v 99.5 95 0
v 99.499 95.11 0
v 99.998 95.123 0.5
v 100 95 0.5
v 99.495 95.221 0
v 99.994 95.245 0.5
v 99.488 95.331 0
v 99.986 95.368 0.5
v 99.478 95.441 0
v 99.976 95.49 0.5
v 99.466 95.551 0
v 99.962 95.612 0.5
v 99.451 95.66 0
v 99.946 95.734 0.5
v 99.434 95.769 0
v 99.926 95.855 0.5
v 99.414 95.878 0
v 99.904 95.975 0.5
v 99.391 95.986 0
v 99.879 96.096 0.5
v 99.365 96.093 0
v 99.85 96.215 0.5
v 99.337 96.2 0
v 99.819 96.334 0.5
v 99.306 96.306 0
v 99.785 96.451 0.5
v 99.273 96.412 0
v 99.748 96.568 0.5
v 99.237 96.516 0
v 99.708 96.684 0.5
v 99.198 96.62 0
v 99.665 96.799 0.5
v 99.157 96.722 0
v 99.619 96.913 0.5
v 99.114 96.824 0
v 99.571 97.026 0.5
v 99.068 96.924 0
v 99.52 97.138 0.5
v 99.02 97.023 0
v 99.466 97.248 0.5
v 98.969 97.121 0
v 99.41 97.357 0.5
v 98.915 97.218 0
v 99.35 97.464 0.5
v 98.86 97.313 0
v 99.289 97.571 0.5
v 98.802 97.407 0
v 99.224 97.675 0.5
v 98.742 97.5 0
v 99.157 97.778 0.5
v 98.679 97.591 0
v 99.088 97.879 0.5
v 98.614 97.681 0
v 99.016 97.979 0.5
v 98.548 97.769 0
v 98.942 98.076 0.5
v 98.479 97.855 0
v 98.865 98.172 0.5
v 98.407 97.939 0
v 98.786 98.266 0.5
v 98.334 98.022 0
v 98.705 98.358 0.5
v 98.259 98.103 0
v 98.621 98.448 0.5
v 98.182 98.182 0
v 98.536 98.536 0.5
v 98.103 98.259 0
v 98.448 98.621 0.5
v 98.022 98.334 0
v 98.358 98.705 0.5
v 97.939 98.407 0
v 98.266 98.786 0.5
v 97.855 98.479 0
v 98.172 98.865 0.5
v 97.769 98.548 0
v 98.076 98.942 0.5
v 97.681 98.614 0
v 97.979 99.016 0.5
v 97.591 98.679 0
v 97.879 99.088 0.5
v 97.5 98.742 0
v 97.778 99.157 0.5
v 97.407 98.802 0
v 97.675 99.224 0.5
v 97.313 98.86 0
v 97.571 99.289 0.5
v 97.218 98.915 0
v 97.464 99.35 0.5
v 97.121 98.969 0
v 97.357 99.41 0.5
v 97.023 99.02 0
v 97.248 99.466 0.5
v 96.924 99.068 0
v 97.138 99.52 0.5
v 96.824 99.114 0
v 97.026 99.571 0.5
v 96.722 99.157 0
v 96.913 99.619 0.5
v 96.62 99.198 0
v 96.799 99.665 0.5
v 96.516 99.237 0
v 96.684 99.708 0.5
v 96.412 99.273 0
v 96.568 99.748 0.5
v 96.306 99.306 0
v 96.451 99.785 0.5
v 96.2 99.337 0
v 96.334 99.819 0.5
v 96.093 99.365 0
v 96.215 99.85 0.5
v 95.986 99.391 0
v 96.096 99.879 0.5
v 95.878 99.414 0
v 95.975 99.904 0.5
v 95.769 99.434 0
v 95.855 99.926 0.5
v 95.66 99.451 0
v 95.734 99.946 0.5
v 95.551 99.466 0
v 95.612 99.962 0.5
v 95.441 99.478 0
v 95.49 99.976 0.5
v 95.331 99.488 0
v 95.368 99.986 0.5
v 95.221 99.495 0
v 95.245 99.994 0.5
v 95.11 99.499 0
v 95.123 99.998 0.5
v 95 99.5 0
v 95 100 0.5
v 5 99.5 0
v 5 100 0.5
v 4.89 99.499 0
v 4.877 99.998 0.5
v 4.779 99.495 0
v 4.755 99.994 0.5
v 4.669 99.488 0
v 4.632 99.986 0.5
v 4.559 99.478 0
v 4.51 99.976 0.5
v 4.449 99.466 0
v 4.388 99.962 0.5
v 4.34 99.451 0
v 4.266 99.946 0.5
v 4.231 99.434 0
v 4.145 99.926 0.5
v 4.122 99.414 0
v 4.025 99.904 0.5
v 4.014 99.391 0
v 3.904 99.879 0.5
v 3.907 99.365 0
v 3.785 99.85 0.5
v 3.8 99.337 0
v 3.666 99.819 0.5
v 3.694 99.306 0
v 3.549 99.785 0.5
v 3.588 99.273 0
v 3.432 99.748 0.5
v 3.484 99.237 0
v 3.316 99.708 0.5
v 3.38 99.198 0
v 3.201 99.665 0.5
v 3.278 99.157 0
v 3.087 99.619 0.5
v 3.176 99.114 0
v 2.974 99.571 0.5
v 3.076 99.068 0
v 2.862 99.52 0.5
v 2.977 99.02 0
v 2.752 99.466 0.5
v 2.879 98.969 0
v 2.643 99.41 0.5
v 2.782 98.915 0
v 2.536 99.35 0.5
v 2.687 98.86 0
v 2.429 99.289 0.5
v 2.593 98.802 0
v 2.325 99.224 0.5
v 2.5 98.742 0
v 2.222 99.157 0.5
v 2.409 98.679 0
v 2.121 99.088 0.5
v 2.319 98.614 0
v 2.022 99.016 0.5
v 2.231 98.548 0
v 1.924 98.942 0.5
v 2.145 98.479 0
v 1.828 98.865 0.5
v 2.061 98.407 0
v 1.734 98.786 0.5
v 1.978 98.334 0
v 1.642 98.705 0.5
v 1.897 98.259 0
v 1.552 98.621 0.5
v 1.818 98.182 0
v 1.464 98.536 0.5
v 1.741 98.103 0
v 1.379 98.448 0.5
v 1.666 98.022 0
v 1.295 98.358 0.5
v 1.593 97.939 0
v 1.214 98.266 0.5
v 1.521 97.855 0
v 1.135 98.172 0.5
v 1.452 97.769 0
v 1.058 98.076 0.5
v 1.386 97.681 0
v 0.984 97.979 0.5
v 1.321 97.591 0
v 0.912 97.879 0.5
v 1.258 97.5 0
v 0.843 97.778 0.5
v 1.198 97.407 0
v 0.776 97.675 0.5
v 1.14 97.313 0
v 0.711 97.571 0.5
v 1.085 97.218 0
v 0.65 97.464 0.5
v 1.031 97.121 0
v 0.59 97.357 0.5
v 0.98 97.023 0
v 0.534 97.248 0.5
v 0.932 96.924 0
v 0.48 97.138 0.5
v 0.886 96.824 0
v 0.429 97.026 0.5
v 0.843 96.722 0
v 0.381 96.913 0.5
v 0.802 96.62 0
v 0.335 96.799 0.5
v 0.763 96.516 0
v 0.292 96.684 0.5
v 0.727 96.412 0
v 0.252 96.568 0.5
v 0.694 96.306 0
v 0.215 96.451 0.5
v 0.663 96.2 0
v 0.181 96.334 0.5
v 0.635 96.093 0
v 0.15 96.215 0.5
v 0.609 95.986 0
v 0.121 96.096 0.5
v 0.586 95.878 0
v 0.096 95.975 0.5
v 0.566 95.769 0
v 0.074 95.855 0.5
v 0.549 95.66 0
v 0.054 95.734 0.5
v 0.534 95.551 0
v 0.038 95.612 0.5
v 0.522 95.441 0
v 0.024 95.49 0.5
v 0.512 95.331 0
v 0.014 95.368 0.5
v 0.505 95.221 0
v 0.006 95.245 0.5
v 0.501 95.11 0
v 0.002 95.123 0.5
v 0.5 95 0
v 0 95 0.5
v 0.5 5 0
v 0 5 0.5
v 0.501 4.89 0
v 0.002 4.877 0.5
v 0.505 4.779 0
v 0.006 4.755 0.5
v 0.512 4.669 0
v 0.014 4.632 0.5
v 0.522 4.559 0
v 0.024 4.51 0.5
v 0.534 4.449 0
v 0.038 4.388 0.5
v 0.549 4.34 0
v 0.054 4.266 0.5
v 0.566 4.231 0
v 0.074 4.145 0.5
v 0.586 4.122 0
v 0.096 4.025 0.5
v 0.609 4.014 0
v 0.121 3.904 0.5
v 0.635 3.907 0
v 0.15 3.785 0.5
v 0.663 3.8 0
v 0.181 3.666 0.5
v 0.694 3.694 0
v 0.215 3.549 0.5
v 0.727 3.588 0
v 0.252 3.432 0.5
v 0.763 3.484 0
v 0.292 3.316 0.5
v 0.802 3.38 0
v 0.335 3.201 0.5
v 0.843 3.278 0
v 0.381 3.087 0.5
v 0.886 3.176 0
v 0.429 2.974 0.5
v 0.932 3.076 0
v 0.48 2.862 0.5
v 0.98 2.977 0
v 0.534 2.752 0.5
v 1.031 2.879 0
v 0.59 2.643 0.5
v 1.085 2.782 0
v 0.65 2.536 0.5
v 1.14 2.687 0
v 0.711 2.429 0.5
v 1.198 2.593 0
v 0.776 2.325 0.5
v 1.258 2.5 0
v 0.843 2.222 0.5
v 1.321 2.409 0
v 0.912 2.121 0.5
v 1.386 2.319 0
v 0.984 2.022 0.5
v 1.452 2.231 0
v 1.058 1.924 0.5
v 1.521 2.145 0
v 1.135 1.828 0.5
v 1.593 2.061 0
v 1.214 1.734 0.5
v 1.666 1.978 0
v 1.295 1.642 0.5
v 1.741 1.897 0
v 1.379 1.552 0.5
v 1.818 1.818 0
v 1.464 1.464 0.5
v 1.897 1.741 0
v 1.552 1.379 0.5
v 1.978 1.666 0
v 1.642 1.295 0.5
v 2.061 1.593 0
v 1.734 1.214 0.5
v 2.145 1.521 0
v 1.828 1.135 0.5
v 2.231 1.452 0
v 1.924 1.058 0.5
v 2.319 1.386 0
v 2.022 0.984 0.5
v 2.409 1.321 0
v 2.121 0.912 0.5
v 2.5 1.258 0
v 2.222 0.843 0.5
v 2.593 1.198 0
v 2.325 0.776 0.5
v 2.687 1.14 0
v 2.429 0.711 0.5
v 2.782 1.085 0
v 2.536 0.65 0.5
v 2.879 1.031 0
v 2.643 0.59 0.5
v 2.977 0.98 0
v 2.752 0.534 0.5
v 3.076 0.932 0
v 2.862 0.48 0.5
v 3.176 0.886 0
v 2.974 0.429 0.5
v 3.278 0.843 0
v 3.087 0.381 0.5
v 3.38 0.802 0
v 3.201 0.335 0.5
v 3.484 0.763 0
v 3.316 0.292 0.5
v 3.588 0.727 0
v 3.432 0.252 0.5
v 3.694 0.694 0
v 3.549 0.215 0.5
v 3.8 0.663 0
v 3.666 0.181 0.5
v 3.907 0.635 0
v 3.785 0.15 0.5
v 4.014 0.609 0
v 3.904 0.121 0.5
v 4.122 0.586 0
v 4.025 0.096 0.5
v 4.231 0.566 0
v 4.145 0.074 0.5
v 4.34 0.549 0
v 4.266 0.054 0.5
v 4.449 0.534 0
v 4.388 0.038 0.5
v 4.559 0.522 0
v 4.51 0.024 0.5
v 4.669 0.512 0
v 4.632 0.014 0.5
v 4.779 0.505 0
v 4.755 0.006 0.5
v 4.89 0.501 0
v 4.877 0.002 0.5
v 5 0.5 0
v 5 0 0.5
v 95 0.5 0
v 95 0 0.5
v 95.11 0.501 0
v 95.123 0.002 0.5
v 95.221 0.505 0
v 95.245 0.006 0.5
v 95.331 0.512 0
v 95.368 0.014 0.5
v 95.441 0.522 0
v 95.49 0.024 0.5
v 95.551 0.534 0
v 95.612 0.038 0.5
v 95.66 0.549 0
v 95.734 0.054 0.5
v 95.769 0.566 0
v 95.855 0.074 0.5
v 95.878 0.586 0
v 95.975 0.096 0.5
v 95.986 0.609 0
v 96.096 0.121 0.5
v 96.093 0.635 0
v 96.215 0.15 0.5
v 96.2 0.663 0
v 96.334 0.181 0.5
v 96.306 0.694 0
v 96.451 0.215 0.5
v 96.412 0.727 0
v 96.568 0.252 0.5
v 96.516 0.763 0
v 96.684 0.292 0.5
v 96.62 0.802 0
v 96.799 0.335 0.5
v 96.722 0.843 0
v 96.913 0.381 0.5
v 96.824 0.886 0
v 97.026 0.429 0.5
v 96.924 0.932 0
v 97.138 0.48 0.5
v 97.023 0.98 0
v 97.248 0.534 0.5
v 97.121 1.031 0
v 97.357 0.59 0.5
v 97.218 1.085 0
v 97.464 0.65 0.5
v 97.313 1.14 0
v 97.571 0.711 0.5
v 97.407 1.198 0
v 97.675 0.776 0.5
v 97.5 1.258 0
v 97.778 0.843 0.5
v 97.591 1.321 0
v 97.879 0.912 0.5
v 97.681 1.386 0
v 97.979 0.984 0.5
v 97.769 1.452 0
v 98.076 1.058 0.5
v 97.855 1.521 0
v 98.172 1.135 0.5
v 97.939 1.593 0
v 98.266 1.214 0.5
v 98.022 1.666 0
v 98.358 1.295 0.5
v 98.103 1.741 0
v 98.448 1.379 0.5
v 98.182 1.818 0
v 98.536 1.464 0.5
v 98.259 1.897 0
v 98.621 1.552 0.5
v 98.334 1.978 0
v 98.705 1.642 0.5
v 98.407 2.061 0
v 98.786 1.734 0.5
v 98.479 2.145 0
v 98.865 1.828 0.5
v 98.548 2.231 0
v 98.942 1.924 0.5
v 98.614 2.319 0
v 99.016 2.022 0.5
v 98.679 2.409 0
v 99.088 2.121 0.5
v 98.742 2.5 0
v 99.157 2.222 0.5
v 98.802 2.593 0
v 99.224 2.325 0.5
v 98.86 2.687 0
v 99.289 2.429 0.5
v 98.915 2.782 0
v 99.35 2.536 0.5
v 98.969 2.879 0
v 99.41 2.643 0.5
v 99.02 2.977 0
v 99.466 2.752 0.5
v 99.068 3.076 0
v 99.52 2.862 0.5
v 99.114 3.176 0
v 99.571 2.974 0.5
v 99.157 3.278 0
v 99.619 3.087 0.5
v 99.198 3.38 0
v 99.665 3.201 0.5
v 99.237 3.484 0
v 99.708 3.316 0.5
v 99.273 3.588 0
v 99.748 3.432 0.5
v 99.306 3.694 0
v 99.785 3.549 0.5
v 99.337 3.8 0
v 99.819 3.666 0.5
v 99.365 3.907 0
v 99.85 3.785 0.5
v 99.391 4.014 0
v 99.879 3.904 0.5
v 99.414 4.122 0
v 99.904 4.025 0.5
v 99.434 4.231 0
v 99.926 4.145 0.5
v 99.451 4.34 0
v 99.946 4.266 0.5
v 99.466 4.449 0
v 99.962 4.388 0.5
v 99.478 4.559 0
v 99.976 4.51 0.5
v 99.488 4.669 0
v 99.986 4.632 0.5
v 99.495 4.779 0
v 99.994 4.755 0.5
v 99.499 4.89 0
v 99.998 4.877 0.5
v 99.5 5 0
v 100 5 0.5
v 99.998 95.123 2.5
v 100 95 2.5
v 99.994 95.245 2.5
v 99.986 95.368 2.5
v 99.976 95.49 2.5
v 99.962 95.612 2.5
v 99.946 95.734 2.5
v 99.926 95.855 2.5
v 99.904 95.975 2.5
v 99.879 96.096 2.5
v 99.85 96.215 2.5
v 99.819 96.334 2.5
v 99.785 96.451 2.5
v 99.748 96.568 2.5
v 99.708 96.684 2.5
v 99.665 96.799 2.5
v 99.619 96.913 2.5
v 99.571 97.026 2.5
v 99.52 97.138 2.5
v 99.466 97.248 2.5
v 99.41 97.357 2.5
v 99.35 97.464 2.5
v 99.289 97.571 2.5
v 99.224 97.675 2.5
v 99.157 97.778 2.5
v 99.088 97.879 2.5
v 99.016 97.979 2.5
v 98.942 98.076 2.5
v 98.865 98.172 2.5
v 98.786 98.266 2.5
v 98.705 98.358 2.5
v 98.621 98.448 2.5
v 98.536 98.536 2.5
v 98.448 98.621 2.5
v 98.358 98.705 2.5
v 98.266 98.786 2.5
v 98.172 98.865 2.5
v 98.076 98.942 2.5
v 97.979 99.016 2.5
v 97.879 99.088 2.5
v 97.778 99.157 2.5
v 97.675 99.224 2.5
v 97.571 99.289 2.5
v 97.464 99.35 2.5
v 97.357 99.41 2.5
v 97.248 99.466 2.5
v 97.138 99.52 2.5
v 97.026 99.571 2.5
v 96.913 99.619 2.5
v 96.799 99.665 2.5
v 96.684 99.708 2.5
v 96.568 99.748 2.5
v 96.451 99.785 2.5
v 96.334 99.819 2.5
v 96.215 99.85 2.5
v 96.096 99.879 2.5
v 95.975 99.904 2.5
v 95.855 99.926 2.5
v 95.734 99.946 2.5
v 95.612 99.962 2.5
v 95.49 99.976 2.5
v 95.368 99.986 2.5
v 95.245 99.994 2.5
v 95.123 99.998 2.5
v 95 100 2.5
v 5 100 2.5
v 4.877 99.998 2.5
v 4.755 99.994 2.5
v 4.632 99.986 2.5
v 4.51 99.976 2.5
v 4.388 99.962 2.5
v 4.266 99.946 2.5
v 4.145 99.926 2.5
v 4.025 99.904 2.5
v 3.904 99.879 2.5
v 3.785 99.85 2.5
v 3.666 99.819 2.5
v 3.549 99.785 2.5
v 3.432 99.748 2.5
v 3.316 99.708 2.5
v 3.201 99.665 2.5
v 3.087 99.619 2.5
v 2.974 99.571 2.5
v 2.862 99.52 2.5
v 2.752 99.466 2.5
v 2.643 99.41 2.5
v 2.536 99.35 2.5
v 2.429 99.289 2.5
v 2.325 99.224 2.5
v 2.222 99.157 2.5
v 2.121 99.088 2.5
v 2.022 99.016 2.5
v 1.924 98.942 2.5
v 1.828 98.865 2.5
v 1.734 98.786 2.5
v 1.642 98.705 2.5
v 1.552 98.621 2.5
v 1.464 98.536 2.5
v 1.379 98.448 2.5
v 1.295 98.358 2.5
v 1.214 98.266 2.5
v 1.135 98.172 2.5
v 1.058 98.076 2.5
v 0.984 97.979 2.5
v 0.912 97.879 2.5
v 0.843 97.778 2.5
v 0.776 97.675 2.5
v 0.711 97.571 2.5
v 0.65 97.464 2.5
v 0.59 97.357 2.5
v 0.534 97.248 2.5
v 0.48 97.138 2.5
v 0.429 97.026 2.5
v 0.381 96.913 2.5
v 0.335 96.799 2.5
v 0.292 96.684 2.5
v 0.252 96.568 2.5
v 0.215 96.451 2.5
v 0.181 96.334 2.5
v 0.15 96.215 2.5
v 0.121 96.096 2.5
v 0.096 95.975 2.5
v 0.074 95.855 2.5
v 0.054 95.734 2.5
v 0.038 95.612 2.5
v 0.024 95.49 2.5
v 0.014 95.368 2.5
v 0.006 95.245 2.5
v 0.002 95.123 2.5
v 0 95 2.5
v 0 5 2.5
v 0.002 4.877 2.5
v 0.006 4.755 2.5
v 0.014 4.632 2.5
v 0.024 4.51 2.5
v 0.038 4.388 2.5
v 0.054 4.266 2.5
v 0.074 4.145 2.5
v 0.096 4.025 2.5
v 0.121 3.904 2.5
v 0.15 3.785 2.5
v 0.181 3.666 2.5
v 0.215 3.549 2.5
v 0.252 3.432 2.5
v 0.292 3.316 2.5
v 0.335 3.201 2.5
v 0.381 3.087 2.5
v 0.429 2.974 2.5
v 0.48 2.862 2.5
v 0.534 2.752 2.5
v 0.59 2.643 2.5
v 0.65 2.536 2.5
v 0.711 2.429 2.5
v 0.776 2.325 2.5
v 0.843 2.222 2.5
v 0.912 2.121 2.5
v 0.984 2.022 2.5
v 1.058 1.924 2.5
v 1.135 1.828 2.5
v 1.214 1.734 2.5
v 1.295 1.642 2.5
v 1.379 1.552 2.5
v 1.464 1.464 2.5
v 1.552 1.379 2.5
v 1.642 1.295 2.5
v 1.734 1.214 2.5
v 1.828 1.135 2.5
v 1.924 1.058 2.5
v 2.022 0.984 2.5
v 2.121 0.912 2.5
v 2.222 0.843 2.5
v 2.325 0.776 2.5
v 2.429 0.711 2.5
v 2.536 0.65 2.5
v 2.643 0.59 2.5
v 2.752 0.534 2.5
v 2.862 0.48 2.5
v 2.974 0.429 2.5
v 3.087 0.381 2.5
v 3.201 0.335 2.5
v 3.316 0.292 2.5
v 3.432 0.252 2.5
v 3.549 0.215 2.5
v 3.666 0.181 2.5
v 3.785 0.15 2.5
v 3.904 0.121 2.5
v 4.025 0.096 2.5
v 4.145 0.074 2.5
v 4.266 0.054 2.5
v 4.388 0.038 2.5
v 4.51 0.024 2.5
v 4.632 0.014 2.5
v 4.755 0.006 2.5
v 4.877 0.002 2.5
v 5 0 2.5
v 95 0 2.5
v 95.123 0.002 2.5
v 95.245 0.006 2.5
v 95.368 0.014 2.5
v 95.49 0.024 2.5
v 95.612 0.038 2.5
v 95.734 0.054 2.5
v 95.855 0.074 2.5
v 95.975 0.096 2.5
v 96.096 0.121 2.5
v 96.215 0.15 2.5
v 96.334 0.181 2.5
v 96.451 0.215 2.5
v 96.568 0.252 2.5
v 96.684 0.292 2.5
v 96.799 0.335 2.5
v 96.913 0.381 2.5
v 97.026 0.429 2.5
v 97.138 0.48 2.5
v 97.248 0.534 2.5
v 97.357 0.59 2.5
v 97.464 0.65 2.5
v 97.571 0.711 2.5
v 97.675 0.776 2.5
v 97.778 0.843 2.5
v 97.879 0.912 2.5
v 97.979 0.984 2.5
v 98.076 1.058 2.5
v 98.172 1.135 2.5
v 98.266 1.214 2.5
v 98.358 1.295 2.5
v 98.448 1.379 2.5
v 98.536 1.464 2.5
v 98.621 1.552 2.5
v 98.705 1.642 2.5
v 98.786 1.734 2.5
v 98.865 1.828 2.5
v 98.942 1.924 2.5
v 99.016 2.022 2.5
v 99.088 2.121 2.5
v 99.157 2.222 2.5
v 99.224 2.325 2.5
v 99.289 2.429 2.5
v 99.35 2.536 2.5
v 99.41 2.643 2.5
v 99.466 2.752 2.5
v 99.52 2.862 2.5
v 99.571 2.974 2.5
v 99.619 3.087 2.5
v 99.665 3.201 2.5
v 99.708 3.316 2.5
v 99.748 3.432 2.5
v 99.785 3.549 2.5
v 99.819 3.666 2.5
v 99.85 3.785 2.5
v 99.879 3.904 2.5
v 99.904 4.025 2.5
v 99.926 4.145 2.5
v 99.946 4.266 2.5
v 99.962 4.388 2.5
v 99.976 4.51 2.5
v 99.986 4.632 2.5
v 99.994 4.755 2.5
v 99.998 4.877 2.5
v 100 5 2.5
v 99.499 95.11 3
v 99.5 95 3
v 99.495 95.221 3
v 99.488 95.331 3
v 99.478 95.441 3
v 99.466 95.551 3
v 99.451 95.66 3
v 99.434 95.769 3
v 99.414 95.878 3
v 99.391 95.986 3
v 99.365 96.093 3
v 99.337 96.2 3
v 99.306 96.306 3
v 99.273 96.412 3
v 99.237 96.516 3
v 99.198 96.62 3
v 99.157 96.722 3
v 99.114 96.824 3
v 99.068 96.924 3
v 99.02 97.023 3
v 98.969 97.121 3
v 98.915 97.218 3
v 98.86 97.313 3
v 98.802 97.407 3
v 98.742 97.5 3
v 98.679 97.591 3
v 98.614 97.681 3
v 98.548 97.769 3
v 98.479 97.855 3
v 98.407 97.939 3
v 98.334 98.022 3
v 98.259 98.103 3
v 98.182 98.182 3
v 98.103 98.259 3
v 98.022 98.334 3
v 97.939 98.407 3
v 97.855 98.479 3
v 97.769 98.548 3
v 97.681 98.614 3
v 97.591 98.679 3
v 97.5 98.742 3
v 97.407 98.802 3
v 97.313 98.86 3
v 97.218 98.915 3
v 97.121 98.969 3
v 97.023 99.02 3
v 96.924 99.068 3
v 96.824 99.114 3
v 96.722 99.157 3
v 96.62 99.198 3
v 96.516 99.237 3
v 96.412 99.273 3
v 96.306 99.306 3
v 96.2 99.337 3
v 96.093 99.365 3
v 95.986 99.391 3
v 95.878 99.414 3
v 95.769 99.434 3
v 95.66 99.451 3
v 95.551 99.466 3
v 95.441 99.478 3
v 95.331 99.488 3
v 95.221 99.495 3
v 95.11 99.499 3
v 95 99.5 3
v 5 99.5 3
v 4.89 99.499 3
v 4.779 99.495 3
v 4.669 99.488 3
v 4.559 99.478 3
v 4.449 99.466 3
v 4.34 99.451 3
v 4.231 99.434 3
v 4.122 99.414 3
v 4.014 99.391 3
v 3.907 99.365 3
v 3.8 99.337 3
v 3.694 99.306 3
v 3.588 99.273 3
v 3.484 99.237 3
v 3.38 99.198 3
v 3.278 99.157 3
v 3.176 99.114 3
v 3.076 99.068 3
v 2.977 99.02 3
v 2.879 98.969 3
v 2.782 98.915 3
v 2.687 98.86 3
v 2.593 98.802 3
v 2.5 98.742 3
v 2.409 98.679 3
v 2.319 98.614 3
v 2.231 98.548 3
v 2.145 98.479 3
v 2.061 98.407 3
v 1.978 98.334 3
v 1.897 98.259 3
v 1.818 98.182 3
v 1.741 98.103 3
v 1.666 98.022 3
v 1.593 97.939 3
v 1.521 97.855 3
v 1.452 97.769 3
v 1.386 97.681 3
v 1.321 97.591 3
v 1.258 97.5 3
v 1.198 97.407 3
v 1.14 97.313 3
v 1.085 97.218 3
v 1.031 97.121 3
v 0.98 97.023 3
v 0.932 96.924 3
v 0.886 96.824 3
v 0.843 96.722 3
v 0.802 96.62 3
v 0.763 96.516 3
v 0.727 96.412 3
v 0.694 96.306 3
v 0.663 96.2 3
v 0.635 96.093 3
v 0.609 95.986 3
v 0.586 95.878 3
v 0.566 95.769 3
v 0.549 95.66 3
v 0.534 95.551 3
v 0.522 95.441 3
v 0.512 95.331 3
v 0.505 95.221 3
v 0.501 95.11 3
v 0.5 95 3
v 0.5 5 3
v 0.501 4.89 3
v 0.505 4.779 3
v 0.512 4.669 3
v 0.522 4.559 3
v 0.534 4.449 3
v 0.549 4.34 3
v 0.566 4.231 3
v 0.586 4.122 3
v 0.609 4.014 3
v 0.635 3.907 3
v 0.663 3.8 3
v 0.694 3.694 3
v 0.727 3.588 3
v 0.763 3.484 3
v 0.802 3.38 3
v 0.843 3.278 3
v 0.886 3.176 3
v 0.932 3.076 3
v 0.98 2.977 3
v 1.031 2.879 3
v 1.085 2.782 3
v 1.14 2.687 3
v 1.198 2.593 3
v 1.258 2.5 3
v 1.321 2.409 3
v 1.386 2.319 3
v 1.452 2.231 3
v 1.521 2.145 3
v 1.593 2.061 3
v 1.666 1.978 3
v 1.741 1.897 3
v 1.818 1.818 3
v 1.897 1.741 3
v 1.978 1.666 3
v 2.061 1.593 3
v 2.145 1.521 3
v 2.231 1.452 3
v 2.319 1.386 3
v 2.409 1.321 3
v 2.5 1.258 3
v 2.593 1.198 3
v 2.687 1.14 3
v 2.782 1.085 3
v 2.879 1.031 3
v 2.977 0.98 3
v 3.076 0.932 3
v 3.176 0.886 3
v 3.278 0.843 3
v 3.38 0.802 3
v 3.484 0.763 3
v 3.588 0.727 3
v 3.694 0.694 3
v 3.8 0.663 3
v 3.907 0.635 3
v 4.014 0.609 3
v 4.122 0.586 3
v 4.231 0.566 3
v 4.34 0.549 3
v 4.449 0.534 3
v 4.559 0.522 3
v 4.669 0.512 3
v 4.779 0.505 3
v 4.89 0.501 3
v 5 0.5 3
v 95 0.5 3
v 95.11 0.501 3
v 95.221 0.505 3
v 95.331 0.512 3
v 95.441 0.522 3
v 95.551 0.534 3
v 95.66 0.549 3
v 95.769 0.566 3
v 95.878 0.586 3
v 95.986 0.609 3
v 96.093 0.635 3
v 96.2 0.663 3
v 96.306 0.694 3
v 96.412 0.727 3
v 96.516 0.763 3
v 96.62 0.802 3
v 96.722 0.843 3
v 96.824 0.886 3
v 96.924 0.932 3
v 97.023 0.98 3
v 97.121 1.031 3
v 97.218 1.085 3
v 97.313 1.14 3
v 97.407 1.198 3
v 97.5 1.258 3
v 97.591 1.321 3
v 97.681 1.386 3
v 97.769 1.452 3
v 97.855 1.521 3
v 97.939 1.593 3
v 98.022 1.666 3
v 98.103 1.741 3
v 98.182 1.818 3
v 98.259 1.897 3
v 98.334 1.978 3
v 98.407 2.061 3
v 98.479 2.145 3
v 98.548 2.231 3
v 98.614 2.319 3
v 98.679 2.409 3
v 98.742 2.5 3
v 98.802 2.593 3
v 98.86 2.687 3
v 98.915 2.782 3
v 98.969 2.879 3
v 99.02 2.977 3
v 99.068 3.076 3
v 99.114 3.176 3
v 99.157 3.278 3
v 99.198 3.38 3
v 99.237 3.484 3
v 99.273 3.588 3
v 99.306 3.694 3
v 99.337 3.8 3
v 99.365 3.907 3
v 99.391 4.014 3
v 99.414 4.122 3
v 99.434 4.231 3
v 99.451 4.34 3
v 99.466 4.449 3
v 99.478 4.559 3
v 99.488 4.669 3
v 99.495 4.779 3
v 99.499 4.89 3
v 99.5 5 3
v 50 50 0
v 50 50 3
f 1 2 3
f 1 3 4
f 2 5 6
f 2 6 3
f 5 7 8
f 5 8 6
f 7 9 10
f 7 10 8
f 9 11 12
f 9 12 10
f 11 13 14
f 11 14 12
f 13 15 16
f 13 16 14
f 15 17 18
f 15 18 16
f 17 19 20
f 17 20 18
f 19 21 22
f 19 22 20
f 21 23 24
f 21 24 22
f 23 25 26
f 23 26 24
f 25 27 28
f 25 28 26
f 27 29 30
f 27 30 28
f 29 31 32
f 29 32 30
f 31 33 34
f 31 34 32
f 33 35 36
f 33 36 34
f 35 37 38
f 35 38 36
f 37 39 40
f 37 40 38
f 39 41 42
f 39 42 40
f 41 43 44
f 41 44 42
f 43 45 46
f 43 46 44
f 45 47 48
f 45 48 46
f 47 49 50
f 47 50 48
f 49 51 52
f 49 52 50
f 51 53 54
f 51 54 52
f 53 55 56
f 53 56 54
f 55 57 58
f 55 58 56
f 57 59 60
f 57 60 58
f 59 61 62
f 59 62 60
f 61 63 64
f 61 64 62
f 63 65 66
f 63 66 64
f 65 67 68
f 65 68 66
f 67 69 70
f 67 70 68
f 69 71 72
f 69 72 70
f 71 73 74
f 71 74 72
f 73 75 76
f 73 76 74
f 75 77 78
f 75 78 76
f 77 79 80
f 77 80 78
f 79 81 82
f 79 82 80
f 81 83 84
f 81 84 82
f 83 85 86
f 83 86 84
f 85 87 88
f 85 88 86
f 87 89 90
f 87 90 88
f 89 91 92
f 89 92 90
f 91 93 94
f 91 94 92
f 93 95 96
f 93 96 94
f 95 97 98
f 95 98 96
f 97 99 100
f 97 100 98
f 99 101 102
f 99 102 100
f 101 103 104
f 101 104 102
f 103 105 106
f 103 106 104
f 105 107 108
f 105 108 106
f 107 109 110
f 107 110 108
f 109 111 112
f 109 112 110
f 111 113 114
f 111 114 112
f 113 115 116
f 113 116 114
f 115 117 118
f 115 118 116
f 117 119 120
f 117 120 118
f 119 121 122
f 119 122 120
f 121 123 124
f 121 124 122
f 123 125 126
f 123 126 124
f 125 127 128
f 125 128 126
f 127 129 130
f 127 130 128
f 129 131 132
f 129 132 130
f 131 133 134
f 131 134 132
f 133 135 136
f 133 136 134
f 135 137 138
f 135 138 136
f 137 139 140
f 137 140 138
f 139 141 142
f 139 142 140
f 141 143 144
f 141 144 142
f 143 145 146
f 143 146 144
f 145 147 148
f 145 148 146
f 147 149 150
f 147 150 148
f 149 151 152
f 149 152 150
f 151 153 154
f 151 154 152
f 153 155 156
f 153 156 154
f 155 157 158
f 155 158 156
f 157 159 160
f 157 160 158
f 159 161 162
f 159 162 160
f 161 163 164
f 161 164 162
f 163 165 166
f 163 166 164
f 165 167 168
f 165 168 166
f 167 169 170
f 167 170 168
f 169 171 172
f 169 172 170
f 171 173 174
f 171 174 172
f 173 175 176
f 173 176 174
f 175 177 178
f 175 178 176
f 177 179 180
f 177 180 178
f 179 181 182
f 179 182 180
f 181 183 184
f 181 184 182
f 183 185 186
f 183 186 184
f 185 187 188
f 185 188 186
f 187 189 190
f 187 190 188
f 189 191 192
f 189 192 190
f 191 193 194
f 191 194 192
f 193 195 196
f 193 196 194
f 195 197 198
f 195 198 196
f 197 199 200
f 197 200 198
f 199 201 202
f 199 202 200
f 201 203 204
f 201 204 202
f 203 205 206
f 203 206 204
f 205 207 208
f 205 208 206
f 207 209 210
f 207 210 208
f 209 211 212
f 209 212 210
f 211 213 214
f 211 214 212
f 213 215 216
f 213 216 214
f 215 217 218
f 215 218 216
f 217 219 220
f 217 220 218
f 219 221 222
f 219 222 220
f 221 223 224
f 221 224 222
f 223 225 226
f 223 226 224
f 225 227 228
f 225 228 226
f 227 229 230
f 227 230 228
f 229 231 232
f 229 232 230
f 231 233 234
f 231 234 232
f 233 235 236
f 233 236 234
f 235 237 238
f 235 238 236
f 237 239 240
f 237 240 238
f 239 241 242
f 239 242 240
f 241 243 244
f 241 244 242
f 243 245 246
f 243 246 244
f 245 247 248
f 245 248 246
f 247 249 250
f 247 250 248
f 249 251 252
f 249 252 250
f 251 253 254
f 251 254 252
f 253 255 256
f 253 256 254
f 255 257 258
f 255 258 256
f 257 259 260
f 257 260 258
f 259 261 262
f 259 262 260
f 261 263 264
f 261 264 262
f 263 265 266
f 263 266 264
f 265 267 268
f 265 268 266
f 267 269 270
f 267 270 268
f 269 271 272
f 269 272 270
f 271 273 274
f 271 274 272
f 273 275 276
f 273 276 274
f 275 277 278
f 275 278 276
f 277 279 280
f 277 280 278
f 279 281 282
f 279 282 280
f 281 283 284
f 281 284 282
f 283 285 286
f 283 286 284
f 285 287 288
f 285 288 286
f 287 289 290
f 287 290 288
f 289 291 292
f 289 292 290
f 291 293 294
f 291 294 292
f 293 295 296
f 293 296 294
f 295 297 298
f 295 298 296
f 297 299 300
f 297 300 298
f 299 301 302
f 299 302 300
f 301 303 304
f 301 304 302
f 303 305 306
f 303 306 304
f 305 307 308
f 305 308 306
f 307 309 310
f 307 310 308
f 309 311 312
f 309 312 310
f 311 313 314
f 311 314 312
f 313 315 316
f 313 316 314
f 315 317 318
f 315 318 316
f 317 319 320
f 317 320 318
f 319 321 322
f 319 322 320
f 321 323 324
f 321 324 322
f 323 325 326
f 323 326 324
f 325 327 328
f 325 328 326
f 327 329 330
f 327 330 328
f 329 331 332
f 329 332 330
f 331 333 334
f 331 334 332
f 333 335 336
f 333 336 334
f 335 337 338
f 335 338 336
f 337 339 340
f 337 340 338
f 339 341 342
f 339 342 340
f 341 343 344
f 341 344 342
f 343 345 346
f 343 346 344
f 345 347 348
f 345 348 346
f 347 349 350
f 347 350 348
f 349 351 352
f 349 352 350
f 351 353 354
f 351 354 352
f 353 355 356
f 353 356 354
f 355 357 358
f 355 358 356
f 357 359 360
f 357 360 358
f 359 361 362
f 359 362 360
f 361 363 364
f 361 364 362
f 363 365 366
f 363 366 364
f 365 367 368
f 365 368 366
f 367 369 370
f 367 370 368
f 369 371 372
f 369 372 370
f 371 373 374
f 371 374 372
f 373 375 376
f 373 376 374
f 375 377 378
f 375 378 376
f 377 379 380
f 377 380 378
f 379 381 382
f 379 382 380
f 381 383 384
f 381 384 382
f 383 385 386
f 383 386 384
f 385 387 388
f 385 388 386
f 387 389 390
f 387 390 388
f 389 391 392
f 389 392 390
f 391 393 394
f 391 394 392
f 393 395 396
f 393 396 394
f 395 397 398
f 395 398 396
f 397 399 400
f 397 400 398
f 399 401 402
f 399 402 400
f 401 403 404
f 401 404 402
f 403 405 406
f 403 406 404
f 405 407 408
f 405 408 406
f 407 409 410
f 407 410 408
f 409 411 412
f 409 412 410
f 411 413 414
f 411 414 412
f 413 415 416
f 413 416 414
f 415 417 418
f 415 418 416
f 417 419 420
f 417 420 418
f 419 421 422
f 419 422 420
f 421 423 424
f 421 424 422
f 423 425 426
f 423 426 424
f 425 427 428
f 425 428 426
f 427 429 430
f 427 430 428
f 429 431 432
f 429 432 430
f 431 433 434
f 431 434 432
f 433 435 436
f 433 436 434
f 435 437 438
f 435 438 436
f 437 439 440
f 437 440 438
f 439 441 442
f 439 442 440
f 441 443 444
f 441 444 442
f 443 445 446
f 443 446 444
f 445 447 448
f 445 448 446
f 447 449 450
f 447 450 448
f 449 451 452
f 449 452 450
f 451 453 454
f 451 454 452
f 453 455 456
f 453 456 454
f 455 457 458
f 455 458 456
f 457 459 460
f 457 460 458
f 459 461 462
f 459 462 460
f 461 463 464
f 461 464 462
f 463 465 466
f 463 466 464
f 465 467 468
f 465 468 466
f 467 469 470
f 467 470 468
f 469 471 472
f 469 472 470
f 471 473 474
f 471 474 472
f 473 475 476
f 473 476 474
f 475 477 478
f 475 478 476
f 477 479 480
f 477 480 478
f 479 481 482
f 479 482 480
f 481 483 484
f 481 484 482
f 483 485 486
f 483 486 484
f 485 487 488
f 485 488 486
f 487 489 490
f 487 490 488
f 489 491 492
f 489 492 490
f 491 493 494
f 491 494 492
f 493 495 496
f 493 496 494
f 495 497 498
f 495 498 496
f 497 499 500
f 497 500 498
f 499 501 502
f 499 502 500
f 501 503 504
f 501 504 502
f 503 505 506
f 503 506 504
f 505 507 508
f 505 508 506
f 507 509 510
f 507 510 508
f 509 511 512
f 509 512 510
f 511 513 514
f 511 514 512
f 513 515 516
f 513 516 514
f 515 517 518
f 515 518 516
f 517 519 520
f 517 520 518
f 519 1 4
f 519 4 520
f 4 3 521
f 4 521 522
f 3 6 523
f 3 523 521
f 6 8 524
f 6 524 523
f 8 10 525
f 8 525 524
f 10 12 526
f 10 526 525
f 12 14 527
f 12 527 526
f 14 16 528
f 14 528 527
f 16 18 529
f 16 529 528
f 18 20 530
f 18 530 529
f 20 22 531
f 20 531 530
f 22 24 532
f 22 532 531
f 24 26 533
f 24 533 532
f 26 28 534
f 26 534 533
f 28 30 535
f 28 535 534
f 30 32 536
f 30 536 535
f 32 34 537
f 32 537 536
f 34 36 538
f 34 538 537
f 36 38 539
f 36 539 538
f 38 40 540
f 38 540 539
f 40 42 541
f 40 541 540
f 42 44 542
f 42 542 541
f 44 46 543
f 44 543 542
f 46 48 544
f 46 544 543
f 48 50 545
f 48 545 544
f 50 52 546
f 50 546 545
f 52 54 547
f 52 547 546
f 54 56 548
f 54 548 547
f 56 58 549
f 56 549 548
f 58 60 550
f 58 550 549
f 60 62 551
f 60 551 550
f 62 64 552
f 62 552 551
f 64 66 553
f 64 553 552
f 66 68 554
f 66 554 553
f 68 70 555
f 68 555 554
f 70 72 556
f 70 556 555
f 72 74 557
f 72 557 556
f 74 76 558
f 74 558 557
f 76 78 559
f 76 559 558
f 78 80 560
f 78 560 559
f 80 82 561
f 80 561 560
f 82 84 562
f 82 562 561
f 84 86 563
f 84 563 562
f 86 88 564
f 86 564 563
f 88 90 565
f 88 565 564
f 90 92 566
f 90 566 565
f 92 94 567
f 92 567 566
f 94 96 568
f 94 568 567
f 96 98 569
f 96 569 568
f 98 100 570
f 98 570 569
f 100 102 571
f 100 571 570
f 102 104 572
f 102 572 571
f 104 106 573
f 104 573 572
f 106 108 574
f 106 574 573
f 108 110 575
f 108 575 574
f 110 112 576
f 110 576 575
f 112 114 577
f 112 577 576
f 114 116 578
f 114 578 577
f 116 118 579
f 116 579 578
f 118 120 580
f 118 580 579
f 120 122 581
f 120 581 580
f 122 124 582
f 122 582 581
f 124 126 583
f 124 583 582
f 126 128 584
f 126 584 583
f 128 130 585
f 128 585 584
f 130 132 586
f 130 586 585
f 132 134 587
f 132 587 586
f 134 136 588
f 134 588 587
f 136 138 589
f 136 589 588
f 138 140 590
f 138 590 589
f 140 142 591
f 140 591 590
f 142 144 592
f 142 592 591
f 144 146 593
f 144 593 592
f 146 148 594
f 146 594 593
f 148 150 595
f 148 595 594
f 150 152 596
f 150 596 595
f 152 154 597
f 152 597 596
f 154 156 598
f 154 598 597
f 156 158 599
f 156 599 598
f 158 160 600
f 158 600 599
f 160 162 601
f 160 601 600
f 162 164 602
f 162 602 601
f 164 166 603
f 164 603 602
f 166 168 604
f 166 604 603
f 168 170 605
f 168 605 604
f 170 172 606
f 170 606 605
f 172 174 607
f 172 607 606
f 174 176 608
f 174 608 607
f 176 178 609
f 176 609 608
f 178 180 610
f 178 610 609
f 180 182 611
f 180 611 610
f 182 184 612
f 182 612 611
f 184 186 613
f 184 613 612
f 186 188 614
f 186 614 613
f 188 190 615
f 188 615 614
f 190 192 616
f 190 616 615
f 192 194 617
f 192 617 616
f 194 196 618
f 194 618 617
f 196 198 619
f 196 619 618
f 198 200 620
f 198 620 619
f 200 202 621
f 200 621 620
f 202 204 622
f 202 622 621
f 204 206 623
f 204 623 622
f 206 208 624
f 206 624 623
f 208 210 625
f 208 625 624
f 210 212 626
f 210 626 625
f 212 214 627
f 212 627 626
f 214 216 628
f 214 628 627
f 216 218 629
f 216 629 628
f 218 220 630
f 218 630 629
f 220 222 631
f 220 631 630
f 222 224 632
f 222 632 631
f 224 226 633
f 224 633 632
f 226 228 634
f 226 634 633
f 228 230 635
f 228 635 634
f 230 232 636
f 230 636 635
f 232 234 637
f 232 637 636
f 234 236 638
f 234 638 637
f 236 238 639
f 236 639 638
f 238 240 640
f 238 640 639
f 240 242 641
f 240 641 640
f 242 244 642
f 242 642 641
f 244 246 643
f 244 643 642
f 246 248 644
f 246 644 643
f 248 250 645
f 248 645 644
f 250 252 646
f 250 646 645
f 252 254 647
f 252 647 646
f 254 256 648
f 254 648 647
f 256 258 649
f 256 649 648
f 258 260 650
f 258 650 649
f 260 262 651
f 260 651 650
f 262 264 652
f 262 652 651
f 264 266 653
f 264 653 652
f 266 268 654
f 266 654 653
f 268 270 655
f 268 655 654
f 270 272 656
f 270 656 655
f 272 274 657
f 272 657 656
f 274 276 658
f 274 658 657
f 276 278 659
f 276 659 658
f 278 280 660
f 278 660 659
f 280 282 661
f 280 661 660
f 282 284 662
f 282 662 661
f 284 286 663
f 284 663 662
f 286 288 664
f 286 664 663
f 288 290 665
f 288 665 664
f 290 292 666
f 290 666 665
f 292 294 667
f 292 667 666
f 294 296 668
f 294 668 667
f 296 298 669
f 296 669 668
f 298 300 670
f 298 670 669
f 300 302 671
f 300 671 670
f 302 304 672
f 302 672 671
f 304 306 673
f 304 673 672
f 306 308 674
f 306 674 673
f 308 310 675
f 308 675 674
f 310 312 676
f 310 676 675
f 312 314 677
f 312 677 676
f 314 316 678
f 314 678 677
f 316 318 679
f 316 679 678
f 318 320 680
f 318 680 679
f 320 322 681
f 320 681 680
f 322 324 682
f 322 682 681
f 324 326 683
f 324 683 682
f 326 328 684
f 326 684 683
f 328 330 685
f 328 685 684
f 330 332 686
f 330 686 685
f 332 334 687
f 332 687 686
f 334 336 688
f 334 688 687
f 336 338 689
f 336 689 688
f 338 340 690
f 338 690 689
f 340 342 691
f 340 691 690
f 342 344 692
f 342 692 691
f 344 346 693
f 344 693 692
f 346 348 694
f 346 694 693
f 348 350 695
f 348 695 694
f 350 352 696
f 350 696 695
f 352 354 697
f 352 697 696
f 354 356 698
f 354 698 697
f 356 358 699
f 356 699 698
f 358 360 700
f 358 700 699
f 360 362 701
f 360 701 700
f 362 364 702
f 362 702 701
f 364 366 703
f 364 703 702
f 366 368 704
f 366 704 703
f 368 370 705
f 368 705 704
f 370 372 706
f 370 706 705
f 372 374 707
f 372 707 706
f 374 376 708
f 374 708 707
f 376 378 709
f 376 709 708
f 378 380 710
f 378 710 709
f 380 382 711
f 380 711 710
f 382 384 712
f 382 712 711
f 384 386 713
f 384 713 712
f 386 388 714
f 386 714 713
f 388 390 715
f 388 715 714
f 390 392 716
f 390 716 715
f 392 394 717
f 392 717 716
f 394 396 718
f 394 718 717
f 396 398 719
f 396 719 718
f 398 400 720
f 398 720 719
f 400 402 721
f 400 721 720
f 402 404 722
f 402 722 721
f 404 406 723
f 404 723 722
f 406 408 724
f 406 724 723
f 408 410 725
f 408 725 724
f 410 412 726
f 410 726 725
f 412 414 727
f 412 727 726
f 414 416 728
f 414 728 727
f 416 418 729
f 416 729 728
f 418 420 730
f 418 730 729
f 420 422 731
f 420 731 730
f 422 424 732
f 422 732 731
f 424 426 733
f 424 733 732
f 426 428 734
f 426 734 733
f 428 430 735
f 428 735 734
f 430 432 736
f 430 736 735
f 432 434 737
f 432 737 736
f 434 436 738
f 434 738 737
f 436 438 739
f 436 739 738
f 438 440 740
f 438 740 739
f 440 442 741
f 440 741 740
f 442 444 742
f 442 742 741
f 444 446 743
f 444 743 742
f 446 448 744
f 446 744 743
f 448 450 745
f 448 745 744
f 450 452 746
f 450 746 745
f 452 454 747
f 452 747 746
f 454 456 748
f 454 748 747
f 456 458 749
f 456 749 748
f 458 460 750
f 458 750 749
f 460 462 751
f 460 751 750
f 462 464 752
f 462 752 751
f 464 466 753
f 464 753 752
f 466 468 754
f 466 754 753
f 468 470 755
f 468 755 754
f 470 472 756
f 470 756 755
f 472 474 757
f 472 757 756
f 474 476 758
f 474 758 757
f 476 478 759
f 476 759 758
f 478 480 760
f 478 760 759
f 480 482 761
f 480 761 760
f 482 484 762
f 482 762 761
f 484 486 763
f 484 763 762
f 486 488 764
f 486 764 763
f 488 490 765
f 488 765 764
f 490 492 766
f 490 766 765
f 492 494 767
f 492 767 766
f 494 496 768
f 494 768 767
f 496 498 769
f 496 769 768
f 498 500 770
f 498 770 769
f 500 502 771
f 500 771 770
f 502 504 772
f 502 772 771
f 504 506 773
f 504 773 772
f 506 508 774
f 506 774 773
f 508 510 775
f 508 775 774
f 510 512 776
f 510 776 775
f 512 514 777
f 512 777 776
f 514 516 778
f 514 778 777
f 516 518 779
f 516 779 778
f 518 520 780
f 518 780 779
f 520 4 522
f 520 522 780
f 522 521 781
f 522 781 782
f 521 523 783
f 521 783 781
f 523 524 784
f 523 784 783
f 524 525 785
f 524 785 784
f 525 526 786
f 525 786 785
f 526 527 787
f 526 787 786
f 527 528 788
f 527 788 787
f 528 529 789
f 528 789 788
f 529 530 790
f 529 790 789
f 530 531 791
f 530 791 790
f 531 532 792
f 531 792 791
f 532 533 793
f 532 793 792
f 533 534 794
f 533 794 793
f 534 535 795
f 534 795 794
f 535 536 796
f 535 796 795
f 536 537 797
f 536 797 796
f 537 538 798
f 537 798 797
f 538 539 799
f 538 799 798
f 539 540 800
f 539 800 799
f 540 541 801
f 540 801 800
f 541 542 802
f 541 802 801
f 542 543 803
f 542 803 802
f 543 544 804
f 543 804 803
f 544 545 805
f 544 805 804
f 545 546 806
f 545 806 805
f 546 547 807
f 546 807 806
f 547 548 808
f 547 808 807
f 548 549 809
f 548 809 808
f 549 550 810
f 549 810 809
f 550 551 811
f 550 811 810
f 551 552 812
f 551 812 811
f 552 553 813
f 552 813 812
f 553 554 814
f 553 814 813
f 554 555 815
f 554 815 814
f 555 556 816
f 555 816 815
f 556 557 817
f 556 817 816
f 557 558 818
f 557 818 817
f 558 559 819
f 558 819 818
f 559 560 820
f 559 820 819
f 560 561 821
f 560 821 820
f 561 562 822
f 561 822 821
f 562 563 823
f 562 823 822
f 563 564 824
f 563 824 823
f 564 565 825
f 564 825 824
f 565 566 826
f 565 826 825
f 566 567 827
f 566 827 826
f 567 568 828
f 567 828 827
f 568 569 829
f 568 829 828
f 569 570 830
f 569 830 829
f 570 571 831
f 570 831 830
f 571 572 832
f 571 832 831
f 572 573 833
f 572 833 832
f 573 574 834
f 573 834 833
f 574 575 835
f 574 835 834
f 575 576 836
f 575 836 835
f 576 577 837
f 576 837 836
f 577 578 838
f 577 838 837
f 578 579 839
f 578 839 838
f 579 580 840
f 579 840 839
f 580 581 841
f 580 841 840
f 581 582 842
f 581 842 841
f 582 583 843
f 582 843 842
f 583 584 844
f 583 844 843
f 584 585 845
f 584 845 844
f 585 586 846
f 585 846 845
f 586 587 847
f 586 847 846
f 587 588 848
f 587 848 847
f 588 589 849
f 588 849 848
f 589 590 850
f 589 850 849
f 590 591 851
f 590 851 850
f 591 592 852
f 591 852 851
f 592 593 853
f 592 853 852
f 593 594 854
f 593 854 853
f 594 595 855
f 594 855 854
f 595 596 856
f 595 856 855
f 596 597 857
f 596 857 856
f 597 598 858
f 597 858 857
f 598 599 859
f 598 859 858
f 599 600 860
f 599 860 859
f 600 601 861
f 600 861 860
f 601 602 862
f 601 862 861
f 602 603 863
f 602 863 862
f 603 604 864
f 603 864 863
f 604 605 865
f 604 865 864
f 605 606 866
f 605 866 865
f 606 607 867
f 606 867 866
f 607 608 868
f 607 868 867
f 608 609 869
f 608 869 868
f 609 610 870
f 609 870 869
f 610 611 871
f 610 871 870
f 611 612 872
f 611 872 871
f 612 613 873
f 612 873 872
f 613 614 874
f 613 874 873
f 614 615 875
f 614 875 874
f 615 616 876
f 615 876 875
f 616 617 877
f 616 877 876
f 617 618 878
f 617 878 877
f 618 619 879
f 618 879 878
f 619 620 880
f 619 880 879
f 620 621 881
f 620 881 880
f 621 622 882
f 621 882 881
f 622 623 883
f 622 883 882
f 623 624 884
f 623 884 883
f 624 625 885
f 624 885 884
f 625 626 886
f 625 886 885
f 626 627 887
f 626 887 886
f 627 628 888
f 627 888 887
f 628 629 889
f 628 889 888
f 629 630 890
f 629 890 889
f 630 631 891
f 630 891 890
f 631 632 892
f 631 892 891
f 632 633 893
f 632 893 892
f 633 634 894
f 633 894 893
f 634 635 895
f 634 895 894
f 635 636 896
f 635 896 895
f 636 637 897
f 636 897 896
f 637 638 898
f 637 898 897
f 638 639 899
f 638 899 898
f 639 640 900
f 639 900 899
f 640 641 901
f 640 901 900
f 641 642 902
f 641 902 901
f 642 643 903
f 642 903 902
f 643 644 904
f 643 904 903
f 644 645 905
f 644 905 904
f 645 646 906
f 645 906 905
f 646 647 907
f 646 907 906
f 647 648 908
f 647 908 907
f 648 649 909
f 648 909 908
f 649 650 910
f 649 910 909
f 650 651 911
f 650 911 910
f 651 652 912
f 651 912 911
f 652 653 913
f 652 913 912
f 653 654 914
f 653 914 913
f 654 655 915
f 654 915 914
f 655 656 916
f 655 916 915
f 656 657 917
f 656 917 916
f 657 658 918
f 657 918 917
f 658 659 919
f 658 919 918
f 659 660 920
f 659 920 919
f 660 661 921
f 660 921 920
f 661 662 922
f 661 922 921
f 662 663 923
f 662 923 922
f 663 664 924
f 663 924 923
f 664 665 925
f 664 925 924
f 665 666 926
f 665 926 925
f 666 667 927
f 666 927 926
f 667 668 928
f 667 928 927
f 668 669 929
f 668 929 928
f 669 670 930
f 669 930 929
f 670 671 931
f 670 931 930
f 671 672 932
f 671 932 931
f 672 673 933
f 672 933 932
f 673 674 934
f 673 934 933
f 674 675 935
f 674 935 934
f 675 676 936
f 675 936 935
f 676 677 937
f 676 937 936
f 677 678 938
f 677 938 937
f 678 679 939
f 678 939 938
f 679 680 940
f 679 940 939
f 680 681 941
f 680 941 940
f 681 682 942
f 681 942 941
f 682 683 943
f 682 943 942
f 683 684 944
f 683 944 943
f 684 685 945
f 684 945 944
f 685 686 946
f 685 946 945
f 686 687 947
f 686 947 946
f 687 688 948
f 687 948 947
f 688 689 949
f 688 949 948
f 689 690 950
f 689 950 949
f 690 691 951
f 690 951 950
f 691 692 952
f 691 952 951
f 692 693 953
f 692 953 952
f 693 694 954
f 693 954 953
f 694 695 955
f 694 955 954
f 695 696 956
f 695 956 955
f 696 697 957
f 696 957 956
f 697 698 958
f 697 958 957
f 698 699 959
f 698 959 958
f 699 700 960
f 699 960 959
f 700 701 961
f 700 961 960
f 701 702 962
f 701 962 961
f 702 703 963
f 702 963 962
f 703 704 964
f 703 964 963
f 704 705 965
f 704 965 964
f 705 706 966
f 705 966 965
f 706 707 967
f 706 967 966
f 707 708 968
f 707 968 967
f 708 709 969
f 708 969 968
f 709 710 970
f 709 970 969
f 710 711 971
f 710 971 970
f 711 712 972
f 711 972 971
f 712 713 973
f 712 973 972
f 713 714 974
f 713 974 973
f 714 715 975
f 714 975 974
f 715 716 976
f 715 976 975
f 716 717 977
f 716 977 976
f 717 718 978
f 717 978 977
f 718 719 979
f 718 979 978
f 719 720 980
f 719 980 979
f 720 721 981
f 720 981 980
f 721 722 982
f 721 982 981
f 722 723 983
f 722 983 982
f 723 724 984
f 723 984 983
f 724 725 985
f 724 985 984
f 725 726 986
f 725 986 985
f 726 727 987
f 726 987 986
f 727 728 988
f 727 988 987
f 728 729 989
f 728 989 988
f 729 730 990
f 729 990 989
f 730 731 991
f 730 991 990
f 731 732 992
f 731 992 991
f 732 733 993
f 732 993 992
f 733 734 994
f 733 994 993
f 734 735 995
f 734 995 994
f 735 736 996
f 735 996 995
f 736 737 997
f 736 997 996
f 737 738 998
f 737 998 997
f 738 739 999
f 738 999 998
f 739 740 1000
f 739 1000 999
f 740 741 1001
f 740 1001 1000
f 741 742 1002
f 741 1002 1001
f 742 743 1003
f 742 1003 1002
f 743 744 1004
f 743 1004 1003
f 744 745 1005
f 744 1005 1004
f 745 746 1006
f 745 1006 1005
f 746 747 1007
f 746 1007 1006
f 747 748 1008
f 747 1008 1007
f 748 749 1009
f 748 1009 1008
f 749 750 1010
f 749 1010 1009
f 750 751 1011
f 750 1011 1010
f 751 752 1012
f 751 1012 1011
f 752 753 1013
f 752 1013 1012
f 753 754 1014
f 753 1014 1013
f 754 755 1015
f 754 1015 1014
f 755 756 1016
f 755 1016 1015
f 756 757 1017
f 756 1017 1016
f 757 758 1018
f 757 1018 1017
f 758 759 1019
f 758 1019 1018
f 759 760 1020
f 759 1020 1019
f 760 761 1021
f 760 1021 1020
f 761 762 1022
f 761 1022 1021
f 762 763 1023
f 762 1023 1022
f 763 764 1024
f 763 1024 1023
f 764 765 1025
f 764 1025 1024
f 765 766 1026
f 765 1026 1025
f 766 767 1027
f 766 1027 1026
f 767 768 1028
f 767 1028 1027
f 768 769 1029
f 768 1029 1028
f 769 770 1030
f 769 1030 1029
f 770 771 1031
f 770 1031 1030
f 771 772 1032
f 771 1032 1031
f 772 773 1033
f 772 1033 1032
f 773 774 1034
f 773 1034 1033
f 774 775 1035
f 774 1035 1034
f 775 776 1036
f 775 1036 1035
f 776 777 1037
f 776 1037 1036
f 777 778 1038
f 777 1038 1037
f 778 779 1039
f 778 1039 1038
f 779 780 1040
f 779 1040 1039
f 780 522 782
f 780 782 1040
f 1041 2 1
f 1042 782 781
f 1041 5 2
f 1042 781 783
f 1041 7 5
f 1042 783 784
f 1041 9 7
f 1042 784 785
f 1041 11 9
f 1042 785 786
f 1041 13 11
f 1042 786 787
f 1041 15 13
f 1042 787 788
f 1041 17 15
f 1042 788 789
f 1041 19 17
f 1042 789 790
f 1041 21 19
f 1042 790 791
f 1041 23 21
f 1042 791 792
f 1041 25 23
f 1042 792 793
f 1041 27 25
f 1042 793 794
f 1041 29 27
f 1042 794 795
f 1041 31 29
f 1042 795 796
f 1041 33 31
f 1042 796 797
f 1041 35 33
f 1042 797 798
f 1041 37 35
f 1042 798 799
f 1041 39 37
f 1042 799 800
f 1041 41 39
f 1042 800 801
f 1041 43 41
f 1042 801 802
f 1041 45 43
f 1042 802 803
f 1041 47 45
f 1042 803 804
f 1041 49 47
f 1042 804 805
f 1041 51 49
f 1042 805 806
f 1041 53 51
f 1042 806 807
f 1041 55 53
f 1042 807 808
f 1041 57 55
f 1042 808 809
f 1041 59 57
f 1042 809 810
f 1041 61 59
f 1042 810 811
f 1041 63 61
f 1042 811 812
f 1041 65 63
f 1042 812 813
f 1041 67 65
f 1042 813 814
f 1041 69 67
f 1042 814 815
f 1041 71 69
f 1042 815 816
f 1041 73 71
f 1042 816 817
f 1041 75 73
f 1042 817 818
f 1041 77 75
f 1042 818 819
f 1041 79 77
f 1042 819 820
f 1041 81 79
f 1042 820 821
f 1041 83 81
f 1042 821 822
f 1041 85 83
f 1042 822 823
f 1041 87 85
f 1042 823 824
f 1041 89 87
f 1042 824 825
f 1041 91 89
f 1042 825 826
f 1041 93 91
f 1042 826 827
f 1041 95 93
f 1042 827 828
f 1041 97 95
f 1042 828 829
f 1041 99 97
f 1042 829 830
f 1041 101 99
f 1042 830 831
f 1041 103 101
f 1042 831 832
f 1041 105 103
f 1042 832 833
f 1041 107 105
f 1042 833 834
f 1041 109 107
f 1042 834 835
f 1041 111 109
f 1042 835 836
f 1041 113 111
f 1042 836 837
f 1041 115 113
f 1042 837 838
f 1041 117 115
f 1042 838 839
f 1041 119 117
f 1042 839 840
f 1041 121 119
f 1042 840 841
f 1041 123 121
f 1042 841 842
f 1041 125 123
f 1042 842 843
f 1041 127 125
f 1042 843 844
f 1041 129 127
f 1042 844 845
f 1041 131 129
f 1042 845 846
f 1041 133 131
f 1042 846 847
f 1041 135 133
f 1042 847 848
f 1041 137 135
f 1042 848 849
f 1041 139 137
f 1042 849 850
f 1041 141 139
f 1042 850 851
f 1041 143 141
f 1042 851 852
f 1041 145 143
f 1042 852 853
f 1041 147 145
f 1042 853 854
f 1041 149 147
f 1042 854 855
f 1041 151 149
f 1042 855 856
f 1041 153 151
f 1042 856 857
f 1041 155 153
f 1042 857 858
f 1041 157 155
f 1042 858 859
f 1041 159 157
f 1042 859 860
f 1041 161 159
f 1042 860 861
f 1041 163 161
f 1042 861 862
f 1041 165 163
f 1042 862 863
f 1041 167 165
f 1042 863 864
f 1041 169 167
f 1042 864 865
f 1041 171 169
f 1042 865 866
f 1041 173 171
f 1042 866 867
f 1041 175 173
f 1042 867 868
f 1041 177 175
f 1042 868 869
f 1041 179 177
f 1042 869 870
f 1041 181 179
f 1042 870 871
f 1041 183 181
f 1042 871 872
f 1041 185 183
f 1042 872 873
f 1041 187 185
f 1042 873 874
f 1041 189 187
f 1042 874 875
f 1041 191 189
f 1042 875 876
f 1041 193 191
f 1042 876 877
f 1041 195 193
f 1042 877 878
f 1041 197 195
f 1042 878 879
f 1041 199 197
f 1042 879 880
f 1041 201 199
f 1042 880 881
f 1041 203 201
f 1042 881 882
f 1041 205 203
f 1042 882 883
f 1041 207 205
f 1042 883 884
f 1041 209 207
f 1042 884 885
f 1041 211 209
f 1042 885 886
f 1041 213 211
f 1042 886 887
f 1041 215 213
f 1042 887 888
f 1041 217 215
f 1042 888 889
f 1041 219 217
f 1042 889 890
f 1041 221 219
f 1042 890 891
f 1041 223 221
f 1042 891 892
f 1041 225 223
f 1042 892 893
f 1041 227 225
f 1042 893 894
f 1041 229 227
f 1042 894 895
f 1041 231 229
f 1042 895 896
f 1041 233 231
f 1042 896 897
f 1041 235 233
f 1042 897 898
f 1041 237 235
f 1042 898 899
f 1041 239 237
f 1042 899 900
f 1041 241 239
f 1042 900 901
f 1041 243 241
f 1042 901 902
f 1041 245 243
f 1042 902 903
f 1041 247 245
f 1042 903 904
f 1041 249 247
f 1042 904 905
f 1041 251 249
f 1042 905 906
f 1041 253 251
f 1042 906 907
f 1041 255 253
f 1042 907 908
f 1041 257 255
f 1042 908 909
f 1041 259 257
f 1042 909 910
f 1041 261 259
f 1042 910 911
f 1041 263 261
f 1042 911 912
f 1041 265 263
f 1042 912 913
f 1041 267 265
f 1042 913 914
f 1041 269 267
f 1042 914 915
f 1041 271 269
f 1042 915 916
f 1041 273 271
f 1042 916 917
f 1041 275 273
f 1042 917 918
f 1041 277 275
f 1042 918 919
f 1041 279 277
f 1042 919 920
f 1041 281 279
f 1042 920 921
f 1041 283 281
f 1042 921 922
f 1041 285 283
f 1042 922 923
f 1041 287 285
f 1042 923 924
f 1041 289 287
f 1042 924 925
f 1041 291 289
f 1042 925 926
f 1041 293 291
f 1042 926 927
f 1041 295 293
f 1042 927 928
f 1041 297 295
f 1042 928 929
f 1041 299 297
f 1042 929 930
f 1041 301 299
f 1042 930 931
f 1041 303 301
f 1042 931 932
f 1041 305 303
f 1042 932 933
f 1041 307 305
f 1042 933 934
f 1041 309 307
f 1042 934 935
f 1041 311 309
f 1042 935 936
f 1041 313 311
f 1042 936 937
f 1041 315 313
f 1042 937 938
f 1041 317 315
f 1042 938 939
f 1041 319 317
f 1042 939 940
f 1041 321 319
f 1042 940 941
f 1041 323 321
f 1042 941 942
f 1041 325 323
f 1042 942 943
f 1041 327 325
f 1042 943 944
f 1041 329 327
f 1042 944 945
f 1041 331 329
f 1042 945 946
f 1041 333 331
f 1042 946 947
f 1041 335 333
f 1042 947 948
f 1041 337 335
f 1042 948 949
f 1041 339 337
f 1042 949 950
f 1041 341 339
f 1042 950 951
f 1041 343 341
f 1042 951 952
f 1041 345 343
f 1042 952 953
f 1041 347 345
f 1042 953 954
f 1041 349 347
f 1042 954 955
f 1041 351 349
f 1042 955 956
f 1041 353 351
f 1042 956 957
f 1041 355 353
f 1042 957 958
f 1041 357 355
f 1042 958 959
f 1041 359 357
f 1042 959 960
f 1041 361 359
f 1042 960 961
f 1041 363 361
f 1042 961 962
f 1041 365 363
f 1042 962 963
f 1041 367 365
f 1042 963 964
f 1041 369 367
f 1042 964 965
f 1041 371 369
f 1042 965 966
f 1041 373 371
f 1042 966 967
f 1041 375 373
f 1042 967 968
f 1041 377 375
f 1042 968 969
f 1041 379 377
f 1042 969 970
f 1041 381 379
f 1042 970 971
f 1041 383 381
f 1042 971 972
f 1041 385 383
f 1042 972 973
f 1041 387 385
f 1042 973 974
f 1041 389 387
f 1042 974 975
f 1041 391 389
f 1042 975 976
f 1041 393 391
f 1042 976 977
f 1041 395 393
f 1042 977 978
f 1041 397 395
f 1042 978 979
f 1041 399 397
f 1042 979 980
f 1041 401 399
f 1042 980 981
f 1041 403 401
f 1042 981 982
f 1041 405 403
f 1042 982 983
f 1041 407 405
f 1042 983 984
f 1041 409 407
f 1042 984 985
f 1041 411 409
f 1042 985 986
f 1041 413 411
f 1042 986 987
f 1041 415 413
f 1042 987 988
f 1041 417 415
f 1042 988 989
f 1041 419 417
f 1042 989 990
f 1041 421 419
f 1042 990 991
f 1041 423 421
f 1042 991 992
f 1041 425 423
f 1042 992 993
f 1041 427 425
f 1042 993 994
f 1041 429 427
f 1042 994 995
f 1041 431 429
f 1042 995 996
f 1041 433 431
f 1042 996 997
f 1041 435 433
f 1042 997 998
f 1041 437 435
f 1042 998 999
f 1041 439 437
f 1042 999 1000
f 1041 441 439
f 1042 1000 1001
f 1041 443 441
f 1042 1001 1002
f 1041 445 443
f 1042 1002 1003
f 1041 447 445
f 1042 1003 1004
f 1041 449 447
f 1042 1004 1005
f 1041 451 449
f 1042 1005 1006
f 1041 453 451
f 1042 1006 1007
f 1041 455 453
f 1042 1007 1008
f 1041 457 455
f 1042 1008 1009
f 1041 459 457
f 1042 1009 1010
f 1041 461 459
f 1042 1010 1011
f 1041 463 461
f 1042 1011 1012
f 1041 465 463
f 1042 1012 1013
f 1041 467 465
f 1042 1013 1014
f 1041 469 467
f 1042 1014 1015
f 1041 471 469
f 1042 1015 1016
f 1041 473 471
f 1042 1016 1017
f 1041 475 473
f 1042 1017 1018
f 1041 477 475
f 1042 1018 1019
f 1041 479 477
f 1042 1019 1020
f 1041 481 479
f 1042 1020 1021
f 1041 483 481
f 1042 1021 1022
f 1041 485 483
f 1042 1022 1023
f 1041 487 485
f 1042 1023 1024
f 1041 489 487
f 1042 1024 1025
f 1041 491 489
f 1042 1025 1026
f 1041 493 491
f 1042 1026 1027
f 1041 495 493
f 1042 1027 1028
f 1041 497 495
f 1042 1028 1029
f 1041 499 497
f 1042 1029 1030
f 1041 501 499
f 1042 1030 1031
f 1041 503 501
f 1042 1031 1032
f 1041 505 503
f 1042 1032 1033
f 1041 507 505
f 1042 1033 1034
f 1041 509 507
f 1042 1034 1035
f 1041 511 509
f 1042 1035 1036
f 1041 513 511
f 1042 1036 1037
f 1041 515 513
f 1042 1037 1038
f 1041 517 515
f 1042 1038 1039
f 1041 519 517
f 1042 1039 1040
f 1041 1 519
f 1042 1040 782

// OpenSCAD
// mm. R: plan-view corner radius. C: 45-degree top/bottom edge bevel.
side=100; length=side; width=side; thickness=3;
radius=5; bevel=0.5;
round_plate=false;
assert(min(length,width,thickness)>0);
assert(radius>=0 && radius<=min(length,width)/2);
assert(bevel>=0 && bevel<min(length,width,thickness)/2);
function ring(z,d)=round_plate ?
    [for(i=[0:255]) [length/2+(length/2-d)*cos(i*360/256),width/2+(width/2-d)*sin(i*360/256),z]] :
    let(r=max(0,radius-d), centers=[[length-d-r,width-d-r],[d+r,width-d-r],[d+r,d+r],[length-d-r,d+r]])
    [for(j=[0:3]) for(i=[0:64]) [centers[j][0]+r*cos(j*90+i*90/64),centers[j][1]+r*sin(j*90+i*90/64),z]];
rings=bevel==0?[[0,0],[thickness,0]]:
    (!round_plate && radius>0 && radius<bevel)?
    [[0,bevel],[bevel-radius,radius],[bevel,0],[thickness-bevel,0],[thickness-bevel+radius,radius],[thickness,bevel]]:
    [[0,bevel],[bevel,0],[thickness-bevel,0],[thickness,bevel]];
n=round_plate?256:260; nr=len(rings);
v=concat([for(pair=rings) each ring(pair[0],pair[1])],[[length/2,width/2,0],[length/2,width/2,thickness]]);
faces=concat(
 [for(j=[0:nr-2]) for(i=[0:n-1]) each [[j*n+i,j*n+(i+1)%n,(j+1)*n+(i+1)%n],[j*n+i,(j+1)*n+(i+1)%n,(j+1)*n+i]]],
 [for(i=[0:n-1]) each [[nr*n,(i+1)%n,i],[nr*n+1,(nr-1)*n+i,(nr-1)*n+(i+1)%n]]]);
// Weld collapsed corner vertices when R=0 or C>=R, then drop zero-area faces.
vr=[for(p=v) [for(q=p) round(q*1000000)/1000000]];
unique=[for(i=[0:len(vr)-1]) if(search([vr[i]],vr)[0]==i) vr[i]];
mapped=[for(f=faces) [for(i=f) search([vr[i]],unique)[0]]];
// OpenSCAD uses clockwise face winding viewed from outside.
polyhedron(points=unique,faces=[for(f=mapped)
    if(norm(cross(unique[f[1]]-unique[f[0]],unique[f[2]]-unique[f[0]]))>0.000000001)
    [f[2],f[1],f[0]]],convexity=10);
